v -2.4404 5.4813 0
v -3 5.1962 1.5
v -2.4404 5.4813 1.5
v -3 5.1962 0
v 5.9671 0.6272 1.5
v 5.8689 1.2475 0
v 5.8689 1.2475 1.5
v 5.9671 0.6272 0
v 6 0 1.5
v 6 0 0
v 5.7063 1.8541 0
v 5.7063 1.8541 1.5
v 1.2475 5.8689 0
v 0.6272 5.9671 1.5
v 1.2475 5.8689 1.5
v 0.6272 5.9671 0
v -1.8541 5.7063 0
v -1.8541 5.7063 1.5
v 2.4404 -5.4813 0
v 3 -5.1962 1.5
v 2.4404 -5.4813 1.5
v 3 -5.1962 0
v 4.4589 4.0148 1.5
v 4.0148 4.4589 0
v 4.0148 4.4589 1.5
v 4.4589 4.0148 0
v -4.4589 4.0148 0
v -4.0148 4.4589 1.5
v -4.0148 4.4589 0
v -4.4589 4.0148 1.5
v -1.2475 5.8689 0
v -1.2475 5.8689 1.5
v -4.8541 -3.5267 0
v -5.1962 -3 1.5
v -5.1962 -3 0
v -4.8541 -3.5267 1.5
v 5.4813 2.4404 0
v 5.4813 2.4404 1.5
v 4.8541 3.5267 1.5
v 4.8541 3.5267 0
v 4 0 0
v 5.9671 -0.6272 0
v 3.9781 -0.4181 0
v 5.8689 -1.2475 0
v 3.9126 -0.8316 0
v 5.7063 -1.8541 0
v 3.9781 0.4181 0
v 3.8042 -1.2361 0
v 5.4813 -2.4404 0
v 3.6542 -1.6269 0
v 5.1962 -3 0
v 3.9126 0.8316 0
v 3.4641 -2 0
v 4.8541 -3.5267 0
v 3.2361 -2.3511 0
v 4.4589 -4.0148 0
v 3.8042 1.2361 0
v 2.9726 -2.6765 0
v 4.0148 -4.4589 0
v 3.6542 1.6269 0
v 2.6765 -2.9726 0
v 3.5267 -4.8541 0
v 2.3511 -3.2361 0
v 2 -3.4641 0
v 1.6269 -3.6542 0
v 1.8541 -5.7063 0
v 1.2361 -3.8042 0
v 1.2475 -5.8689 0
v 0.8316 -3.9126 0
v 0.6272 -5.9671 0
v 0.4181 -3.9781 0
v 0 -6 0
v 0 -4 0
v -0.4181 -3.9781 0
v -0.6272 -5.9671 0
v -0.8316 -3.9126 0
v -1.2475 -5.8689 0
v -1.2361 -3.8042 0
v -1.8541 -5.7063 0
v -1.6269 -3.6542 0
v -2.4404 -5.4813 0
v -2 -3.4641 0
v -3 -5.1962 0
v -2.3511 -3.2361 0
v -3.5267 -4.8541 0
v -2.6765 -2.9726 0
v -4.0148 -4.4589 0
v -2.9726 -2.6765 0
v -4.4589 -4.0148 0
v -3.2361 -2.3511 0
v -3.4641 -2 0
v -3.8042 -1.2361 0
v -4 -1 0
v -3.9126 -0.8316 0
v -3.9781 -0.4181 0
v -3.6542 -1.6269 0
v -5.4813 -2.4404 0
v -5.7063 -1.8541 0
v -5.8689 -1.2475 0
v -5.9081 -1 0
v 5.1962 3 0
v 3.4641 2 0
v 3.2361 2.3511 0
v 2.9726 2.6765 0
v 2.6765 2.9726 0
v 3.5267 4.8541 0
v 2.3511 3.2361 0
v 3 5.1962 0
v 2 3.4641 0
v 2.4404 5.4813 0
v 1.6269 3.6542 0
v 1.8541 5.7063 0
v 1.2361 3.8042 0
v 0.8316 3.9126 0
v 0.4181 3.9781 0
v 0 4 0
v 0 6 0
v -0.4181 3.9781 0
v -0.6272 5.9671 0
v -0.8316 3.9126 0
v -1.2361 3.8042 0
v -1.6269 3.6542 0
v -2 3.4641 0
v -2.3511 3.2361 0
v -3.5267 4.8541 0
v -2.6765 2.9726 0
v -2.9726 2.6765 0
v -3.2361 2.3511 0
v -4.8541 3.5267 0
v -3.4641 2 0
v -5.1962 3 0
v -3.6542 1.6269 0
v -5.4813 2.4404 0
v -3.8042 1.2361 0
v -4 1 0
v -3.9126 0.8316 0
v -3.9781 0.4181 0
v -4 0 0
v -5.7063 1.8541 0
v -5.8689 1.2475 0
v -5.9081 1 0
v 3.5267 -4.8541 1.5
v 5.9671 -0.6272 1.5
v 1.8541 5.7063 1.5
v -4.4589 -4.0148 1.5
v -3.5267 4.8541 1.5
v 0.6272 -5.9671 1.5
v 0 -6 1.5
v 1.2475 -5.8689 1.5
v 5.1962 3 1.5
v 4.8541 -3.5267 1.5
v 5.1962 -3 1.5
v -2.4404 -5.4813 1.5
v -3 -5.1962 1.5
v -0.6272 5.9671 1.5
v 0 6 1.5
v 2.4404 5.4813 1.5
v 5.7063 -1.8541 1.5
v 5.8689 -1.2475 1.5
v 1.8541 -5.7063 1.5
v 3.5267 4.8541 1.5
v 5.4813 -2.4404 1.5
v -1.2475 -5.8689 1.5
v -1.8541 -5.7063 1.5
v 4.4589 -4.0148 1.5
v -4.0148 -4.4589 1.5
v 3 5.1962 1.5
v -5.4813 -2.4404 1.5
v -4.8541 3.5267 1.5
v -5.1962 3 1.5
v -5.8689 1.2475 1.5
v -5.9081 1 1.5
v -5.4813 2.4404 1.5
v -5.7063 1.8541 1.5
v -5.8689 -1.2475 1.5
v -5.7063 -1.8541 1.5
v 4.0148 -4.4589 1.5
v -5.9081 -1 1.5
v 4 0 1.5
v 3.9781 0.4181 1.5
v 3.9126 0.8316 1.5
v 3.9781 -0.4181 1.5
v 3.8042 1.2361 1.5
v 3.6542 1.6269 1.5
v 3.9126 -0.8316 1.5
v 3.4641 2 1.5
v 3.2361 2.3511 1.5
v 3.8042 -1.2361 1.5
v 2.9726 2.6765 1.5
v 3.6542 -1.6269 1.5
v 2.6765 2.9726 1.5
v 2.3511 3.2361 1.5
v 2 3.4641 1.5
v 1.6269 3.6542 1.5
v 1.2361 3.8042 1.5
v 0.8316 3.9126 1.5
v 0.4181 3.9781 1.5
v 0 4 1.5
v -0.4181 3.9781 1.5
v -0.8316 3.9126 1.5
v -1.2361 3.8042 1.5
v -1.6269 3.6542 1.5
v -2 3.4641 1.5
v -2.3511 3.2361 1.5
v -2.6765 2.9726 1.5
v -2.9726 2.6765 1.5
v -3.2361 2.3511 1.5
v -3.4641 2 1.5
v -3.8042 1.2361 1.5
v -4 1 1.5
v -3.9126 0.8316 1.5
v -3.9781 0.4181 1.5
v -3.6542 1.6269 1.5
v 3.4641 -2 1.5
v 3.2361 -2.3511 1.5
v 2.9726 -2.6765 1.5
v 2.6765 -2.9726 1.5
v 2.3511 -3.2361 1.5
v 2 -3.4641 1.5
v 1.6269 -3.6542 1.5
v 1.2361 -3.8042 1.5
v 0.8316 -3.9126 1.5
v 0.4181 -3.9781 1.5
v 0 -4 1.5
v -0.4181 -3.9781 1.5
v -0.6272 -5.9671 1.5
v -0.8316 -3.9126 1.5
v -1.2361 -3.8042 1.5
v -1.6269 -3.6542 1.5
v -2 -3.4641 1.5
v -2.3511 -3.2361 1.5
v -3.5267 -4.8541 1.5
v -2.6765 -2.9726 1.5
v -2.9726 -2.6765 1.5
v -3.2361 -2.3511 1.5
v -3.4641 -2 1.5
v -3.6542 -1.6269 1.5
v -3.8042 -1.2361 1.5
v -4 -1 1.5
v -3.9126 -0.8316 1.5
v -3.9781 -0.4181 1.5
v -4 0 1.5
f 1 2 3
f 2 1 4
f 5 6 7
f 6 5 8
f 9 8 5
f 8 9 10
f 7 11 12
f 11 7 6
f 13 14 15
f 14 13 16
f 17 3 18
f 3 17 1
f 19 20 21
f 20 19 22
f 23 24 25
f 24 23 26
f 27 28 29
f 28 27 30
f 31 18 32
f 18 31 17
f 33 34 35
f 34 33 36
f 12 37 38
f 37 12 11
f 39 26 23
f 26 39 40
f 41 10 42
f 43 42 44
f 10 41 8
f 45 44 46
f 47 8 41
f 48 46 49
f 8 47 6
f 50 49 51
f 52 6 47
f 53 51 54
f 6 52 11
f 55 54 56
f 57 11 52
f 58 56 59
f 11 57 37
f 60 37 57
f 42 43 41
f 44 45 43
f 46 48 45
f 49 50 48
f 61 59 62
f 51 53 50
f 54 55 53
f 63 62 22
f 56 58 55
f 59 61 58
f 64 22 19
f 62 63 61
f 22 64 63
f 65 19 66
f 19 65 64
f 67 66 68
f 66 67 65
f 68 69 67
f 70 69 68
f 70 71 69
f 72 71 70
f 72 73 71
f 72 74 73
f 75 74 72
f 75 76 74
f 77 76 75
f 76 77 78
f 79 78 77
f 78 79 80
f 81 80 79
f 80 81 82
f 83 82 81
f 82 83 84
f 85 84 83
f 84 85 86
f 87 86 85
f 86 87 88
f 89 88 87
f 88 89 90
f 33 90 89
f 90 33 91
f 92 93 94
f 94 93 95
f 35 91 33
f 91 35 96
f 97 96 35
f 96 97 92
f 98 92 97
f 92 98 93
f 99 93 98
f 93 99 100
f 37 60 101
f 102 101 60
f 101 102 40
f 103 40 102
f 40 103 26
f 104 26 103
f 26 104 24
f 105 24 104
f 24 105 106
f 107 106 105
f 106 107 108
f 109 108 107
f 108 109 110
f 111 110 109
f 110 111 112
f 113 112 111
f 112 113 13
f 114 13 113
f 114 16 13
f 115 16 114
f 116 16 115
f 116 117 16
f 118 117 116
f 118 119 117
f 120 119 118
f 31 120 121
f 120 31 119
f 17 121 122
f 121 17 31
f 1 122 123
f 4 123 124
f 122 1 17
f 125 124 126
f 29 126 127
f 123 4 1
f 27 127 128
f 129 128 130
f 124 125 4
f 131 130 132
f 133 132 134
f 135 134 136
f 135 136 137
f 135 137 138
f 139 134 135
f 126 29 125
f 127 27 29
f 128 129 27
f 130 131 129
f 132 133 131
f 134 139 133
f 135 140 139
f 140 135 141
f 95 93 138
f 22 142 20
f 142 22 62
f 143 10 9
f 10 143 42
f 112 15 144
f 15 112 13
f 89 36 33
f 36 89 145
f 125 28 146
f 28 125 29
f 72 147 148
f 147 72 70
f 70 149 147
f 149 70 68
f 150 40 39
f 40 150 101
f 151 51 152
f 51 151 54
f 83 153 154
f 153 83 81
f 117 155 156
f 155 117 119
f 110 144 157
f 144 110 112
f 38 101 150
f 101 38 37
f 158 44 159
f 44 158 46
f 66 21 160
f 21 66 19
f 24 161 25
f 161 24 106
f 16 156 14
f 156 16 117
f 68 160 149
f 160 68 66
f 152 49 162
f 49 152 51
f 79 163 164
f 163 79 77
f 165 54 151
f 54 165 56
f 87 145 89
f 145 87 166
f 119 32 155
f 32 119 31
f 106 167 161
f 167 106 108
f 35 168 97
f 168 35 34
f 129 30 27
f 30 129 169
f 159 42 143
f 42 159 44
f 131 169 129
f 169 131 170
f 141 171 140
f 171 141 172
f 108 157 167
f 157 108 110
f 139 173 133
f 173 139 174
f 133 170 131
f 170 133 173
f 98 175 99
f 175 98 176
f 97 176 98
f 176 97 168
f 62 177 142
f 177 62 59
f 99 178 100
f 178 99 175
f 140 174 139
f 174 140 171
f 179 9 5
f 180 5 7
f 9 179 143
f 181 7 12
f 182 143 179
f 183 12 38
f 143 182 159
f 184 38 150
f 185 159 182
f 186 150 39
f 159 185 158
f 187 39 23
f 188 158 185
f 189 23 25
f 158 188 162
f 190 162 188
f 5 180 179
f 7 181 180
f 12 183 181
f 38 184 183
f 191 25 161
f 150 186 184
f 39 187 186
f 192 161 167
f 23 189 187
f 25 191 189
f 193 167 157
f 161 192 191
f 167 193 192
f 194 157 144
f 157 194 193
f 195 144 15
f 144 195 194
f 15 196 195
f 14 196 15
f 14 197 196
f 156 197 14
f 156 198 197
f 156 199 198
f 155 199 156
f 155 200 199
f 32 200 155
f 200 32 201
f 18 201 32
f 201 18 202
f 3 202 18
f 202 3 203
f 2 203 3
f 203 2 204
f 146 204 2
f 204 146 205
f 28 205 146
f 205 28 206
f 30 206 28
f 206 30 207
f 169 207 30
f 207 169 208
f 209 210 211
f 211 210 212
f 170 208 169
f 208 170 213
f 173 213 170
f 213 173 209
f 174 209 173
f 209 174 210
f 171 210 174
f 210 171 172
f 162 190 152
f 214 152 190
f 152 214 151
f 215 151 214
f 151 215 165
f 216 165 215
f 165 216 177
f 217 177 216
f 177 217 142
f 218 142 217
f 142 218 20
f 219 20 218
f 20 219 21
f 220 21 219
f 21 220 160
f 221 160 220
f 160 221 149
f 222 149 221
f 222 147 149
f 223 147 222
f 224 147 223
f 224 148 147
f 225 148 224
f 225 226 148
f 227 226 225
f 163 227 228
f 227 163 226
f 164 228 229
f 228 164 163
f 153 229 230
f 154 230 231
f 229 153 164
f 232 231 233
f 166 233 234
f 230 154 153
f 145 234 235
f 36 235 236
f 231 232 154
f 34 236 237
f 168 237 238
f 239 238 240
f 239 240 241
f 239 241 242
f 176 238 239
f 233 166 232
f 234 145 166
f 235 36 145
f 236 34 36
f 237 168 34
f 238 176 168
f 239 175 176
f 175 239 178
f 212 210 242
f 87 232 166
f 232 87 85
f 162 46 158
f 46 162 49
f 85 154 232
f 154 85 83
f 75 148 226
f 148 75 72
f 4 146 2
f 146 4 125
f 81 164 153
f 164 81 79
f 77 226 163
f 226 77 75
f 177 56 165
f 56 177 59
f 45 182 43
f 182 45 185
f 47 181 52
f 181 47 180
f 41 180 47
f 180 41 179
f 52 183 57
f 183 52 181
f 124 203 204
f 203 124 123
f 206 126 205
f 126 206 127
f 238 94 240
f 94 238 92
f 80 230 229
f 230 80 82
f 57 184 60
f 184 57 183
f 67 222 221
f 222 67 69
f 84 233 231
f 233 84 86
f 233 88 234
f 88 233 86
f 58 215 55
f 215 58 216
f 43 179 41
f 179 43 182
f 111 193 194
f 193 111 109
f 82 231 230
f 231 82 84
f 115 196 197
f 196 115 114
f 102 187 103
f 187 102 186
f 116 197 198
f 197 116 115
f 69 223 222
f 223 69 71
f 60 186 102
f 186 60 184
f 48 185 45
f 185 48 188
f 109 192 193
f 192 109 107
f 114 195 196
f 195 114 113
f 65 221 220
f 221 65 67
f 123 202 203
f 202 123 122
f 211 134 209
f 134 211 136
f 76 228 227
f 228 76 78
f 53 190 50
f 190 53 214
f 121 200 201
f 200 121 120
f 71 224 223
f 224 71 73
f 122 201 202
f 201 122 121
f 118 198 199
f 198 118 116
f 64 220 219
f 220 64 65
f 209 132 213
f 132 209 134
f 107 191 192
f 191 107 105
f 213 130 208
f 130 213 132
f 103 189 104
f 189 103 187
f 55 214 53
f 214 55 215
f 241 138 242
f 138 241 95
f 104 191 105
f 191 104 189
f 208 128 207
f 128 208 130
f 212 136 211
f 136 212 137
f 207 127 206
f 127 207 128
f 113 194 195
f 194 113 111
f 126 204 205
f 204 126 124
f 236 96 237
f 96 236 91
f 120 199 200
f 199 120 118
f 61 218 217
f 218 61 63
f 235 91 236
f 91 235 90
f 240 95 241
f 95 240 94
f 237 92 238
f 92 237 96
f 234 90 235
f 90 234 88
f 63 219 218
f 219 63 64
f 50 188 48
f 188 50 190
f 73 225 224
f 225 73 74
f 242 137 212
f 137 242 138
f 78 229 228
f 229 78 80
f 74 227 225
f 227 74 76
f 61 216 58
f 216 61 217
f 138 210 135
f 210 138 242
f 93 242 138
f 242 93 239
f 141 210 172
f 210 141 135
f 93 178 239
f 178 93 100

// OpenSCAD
// Internal retaining ring.
$fn = 60;
eps = 0.02;
inner_d = 8;
outer_d = 12;
thickness = max(0.8, 1.5);
difference() { cylinder(d=outer_d,h=thickness); translate([0,0,-eps]) cylinder(d=inner_d,h=thickness+2*eps); translate([-outer_d/2-eps,-1,-eps]) cube([outer_d/2-inner_d/2+eps,2,thickness+2*eps]); }
